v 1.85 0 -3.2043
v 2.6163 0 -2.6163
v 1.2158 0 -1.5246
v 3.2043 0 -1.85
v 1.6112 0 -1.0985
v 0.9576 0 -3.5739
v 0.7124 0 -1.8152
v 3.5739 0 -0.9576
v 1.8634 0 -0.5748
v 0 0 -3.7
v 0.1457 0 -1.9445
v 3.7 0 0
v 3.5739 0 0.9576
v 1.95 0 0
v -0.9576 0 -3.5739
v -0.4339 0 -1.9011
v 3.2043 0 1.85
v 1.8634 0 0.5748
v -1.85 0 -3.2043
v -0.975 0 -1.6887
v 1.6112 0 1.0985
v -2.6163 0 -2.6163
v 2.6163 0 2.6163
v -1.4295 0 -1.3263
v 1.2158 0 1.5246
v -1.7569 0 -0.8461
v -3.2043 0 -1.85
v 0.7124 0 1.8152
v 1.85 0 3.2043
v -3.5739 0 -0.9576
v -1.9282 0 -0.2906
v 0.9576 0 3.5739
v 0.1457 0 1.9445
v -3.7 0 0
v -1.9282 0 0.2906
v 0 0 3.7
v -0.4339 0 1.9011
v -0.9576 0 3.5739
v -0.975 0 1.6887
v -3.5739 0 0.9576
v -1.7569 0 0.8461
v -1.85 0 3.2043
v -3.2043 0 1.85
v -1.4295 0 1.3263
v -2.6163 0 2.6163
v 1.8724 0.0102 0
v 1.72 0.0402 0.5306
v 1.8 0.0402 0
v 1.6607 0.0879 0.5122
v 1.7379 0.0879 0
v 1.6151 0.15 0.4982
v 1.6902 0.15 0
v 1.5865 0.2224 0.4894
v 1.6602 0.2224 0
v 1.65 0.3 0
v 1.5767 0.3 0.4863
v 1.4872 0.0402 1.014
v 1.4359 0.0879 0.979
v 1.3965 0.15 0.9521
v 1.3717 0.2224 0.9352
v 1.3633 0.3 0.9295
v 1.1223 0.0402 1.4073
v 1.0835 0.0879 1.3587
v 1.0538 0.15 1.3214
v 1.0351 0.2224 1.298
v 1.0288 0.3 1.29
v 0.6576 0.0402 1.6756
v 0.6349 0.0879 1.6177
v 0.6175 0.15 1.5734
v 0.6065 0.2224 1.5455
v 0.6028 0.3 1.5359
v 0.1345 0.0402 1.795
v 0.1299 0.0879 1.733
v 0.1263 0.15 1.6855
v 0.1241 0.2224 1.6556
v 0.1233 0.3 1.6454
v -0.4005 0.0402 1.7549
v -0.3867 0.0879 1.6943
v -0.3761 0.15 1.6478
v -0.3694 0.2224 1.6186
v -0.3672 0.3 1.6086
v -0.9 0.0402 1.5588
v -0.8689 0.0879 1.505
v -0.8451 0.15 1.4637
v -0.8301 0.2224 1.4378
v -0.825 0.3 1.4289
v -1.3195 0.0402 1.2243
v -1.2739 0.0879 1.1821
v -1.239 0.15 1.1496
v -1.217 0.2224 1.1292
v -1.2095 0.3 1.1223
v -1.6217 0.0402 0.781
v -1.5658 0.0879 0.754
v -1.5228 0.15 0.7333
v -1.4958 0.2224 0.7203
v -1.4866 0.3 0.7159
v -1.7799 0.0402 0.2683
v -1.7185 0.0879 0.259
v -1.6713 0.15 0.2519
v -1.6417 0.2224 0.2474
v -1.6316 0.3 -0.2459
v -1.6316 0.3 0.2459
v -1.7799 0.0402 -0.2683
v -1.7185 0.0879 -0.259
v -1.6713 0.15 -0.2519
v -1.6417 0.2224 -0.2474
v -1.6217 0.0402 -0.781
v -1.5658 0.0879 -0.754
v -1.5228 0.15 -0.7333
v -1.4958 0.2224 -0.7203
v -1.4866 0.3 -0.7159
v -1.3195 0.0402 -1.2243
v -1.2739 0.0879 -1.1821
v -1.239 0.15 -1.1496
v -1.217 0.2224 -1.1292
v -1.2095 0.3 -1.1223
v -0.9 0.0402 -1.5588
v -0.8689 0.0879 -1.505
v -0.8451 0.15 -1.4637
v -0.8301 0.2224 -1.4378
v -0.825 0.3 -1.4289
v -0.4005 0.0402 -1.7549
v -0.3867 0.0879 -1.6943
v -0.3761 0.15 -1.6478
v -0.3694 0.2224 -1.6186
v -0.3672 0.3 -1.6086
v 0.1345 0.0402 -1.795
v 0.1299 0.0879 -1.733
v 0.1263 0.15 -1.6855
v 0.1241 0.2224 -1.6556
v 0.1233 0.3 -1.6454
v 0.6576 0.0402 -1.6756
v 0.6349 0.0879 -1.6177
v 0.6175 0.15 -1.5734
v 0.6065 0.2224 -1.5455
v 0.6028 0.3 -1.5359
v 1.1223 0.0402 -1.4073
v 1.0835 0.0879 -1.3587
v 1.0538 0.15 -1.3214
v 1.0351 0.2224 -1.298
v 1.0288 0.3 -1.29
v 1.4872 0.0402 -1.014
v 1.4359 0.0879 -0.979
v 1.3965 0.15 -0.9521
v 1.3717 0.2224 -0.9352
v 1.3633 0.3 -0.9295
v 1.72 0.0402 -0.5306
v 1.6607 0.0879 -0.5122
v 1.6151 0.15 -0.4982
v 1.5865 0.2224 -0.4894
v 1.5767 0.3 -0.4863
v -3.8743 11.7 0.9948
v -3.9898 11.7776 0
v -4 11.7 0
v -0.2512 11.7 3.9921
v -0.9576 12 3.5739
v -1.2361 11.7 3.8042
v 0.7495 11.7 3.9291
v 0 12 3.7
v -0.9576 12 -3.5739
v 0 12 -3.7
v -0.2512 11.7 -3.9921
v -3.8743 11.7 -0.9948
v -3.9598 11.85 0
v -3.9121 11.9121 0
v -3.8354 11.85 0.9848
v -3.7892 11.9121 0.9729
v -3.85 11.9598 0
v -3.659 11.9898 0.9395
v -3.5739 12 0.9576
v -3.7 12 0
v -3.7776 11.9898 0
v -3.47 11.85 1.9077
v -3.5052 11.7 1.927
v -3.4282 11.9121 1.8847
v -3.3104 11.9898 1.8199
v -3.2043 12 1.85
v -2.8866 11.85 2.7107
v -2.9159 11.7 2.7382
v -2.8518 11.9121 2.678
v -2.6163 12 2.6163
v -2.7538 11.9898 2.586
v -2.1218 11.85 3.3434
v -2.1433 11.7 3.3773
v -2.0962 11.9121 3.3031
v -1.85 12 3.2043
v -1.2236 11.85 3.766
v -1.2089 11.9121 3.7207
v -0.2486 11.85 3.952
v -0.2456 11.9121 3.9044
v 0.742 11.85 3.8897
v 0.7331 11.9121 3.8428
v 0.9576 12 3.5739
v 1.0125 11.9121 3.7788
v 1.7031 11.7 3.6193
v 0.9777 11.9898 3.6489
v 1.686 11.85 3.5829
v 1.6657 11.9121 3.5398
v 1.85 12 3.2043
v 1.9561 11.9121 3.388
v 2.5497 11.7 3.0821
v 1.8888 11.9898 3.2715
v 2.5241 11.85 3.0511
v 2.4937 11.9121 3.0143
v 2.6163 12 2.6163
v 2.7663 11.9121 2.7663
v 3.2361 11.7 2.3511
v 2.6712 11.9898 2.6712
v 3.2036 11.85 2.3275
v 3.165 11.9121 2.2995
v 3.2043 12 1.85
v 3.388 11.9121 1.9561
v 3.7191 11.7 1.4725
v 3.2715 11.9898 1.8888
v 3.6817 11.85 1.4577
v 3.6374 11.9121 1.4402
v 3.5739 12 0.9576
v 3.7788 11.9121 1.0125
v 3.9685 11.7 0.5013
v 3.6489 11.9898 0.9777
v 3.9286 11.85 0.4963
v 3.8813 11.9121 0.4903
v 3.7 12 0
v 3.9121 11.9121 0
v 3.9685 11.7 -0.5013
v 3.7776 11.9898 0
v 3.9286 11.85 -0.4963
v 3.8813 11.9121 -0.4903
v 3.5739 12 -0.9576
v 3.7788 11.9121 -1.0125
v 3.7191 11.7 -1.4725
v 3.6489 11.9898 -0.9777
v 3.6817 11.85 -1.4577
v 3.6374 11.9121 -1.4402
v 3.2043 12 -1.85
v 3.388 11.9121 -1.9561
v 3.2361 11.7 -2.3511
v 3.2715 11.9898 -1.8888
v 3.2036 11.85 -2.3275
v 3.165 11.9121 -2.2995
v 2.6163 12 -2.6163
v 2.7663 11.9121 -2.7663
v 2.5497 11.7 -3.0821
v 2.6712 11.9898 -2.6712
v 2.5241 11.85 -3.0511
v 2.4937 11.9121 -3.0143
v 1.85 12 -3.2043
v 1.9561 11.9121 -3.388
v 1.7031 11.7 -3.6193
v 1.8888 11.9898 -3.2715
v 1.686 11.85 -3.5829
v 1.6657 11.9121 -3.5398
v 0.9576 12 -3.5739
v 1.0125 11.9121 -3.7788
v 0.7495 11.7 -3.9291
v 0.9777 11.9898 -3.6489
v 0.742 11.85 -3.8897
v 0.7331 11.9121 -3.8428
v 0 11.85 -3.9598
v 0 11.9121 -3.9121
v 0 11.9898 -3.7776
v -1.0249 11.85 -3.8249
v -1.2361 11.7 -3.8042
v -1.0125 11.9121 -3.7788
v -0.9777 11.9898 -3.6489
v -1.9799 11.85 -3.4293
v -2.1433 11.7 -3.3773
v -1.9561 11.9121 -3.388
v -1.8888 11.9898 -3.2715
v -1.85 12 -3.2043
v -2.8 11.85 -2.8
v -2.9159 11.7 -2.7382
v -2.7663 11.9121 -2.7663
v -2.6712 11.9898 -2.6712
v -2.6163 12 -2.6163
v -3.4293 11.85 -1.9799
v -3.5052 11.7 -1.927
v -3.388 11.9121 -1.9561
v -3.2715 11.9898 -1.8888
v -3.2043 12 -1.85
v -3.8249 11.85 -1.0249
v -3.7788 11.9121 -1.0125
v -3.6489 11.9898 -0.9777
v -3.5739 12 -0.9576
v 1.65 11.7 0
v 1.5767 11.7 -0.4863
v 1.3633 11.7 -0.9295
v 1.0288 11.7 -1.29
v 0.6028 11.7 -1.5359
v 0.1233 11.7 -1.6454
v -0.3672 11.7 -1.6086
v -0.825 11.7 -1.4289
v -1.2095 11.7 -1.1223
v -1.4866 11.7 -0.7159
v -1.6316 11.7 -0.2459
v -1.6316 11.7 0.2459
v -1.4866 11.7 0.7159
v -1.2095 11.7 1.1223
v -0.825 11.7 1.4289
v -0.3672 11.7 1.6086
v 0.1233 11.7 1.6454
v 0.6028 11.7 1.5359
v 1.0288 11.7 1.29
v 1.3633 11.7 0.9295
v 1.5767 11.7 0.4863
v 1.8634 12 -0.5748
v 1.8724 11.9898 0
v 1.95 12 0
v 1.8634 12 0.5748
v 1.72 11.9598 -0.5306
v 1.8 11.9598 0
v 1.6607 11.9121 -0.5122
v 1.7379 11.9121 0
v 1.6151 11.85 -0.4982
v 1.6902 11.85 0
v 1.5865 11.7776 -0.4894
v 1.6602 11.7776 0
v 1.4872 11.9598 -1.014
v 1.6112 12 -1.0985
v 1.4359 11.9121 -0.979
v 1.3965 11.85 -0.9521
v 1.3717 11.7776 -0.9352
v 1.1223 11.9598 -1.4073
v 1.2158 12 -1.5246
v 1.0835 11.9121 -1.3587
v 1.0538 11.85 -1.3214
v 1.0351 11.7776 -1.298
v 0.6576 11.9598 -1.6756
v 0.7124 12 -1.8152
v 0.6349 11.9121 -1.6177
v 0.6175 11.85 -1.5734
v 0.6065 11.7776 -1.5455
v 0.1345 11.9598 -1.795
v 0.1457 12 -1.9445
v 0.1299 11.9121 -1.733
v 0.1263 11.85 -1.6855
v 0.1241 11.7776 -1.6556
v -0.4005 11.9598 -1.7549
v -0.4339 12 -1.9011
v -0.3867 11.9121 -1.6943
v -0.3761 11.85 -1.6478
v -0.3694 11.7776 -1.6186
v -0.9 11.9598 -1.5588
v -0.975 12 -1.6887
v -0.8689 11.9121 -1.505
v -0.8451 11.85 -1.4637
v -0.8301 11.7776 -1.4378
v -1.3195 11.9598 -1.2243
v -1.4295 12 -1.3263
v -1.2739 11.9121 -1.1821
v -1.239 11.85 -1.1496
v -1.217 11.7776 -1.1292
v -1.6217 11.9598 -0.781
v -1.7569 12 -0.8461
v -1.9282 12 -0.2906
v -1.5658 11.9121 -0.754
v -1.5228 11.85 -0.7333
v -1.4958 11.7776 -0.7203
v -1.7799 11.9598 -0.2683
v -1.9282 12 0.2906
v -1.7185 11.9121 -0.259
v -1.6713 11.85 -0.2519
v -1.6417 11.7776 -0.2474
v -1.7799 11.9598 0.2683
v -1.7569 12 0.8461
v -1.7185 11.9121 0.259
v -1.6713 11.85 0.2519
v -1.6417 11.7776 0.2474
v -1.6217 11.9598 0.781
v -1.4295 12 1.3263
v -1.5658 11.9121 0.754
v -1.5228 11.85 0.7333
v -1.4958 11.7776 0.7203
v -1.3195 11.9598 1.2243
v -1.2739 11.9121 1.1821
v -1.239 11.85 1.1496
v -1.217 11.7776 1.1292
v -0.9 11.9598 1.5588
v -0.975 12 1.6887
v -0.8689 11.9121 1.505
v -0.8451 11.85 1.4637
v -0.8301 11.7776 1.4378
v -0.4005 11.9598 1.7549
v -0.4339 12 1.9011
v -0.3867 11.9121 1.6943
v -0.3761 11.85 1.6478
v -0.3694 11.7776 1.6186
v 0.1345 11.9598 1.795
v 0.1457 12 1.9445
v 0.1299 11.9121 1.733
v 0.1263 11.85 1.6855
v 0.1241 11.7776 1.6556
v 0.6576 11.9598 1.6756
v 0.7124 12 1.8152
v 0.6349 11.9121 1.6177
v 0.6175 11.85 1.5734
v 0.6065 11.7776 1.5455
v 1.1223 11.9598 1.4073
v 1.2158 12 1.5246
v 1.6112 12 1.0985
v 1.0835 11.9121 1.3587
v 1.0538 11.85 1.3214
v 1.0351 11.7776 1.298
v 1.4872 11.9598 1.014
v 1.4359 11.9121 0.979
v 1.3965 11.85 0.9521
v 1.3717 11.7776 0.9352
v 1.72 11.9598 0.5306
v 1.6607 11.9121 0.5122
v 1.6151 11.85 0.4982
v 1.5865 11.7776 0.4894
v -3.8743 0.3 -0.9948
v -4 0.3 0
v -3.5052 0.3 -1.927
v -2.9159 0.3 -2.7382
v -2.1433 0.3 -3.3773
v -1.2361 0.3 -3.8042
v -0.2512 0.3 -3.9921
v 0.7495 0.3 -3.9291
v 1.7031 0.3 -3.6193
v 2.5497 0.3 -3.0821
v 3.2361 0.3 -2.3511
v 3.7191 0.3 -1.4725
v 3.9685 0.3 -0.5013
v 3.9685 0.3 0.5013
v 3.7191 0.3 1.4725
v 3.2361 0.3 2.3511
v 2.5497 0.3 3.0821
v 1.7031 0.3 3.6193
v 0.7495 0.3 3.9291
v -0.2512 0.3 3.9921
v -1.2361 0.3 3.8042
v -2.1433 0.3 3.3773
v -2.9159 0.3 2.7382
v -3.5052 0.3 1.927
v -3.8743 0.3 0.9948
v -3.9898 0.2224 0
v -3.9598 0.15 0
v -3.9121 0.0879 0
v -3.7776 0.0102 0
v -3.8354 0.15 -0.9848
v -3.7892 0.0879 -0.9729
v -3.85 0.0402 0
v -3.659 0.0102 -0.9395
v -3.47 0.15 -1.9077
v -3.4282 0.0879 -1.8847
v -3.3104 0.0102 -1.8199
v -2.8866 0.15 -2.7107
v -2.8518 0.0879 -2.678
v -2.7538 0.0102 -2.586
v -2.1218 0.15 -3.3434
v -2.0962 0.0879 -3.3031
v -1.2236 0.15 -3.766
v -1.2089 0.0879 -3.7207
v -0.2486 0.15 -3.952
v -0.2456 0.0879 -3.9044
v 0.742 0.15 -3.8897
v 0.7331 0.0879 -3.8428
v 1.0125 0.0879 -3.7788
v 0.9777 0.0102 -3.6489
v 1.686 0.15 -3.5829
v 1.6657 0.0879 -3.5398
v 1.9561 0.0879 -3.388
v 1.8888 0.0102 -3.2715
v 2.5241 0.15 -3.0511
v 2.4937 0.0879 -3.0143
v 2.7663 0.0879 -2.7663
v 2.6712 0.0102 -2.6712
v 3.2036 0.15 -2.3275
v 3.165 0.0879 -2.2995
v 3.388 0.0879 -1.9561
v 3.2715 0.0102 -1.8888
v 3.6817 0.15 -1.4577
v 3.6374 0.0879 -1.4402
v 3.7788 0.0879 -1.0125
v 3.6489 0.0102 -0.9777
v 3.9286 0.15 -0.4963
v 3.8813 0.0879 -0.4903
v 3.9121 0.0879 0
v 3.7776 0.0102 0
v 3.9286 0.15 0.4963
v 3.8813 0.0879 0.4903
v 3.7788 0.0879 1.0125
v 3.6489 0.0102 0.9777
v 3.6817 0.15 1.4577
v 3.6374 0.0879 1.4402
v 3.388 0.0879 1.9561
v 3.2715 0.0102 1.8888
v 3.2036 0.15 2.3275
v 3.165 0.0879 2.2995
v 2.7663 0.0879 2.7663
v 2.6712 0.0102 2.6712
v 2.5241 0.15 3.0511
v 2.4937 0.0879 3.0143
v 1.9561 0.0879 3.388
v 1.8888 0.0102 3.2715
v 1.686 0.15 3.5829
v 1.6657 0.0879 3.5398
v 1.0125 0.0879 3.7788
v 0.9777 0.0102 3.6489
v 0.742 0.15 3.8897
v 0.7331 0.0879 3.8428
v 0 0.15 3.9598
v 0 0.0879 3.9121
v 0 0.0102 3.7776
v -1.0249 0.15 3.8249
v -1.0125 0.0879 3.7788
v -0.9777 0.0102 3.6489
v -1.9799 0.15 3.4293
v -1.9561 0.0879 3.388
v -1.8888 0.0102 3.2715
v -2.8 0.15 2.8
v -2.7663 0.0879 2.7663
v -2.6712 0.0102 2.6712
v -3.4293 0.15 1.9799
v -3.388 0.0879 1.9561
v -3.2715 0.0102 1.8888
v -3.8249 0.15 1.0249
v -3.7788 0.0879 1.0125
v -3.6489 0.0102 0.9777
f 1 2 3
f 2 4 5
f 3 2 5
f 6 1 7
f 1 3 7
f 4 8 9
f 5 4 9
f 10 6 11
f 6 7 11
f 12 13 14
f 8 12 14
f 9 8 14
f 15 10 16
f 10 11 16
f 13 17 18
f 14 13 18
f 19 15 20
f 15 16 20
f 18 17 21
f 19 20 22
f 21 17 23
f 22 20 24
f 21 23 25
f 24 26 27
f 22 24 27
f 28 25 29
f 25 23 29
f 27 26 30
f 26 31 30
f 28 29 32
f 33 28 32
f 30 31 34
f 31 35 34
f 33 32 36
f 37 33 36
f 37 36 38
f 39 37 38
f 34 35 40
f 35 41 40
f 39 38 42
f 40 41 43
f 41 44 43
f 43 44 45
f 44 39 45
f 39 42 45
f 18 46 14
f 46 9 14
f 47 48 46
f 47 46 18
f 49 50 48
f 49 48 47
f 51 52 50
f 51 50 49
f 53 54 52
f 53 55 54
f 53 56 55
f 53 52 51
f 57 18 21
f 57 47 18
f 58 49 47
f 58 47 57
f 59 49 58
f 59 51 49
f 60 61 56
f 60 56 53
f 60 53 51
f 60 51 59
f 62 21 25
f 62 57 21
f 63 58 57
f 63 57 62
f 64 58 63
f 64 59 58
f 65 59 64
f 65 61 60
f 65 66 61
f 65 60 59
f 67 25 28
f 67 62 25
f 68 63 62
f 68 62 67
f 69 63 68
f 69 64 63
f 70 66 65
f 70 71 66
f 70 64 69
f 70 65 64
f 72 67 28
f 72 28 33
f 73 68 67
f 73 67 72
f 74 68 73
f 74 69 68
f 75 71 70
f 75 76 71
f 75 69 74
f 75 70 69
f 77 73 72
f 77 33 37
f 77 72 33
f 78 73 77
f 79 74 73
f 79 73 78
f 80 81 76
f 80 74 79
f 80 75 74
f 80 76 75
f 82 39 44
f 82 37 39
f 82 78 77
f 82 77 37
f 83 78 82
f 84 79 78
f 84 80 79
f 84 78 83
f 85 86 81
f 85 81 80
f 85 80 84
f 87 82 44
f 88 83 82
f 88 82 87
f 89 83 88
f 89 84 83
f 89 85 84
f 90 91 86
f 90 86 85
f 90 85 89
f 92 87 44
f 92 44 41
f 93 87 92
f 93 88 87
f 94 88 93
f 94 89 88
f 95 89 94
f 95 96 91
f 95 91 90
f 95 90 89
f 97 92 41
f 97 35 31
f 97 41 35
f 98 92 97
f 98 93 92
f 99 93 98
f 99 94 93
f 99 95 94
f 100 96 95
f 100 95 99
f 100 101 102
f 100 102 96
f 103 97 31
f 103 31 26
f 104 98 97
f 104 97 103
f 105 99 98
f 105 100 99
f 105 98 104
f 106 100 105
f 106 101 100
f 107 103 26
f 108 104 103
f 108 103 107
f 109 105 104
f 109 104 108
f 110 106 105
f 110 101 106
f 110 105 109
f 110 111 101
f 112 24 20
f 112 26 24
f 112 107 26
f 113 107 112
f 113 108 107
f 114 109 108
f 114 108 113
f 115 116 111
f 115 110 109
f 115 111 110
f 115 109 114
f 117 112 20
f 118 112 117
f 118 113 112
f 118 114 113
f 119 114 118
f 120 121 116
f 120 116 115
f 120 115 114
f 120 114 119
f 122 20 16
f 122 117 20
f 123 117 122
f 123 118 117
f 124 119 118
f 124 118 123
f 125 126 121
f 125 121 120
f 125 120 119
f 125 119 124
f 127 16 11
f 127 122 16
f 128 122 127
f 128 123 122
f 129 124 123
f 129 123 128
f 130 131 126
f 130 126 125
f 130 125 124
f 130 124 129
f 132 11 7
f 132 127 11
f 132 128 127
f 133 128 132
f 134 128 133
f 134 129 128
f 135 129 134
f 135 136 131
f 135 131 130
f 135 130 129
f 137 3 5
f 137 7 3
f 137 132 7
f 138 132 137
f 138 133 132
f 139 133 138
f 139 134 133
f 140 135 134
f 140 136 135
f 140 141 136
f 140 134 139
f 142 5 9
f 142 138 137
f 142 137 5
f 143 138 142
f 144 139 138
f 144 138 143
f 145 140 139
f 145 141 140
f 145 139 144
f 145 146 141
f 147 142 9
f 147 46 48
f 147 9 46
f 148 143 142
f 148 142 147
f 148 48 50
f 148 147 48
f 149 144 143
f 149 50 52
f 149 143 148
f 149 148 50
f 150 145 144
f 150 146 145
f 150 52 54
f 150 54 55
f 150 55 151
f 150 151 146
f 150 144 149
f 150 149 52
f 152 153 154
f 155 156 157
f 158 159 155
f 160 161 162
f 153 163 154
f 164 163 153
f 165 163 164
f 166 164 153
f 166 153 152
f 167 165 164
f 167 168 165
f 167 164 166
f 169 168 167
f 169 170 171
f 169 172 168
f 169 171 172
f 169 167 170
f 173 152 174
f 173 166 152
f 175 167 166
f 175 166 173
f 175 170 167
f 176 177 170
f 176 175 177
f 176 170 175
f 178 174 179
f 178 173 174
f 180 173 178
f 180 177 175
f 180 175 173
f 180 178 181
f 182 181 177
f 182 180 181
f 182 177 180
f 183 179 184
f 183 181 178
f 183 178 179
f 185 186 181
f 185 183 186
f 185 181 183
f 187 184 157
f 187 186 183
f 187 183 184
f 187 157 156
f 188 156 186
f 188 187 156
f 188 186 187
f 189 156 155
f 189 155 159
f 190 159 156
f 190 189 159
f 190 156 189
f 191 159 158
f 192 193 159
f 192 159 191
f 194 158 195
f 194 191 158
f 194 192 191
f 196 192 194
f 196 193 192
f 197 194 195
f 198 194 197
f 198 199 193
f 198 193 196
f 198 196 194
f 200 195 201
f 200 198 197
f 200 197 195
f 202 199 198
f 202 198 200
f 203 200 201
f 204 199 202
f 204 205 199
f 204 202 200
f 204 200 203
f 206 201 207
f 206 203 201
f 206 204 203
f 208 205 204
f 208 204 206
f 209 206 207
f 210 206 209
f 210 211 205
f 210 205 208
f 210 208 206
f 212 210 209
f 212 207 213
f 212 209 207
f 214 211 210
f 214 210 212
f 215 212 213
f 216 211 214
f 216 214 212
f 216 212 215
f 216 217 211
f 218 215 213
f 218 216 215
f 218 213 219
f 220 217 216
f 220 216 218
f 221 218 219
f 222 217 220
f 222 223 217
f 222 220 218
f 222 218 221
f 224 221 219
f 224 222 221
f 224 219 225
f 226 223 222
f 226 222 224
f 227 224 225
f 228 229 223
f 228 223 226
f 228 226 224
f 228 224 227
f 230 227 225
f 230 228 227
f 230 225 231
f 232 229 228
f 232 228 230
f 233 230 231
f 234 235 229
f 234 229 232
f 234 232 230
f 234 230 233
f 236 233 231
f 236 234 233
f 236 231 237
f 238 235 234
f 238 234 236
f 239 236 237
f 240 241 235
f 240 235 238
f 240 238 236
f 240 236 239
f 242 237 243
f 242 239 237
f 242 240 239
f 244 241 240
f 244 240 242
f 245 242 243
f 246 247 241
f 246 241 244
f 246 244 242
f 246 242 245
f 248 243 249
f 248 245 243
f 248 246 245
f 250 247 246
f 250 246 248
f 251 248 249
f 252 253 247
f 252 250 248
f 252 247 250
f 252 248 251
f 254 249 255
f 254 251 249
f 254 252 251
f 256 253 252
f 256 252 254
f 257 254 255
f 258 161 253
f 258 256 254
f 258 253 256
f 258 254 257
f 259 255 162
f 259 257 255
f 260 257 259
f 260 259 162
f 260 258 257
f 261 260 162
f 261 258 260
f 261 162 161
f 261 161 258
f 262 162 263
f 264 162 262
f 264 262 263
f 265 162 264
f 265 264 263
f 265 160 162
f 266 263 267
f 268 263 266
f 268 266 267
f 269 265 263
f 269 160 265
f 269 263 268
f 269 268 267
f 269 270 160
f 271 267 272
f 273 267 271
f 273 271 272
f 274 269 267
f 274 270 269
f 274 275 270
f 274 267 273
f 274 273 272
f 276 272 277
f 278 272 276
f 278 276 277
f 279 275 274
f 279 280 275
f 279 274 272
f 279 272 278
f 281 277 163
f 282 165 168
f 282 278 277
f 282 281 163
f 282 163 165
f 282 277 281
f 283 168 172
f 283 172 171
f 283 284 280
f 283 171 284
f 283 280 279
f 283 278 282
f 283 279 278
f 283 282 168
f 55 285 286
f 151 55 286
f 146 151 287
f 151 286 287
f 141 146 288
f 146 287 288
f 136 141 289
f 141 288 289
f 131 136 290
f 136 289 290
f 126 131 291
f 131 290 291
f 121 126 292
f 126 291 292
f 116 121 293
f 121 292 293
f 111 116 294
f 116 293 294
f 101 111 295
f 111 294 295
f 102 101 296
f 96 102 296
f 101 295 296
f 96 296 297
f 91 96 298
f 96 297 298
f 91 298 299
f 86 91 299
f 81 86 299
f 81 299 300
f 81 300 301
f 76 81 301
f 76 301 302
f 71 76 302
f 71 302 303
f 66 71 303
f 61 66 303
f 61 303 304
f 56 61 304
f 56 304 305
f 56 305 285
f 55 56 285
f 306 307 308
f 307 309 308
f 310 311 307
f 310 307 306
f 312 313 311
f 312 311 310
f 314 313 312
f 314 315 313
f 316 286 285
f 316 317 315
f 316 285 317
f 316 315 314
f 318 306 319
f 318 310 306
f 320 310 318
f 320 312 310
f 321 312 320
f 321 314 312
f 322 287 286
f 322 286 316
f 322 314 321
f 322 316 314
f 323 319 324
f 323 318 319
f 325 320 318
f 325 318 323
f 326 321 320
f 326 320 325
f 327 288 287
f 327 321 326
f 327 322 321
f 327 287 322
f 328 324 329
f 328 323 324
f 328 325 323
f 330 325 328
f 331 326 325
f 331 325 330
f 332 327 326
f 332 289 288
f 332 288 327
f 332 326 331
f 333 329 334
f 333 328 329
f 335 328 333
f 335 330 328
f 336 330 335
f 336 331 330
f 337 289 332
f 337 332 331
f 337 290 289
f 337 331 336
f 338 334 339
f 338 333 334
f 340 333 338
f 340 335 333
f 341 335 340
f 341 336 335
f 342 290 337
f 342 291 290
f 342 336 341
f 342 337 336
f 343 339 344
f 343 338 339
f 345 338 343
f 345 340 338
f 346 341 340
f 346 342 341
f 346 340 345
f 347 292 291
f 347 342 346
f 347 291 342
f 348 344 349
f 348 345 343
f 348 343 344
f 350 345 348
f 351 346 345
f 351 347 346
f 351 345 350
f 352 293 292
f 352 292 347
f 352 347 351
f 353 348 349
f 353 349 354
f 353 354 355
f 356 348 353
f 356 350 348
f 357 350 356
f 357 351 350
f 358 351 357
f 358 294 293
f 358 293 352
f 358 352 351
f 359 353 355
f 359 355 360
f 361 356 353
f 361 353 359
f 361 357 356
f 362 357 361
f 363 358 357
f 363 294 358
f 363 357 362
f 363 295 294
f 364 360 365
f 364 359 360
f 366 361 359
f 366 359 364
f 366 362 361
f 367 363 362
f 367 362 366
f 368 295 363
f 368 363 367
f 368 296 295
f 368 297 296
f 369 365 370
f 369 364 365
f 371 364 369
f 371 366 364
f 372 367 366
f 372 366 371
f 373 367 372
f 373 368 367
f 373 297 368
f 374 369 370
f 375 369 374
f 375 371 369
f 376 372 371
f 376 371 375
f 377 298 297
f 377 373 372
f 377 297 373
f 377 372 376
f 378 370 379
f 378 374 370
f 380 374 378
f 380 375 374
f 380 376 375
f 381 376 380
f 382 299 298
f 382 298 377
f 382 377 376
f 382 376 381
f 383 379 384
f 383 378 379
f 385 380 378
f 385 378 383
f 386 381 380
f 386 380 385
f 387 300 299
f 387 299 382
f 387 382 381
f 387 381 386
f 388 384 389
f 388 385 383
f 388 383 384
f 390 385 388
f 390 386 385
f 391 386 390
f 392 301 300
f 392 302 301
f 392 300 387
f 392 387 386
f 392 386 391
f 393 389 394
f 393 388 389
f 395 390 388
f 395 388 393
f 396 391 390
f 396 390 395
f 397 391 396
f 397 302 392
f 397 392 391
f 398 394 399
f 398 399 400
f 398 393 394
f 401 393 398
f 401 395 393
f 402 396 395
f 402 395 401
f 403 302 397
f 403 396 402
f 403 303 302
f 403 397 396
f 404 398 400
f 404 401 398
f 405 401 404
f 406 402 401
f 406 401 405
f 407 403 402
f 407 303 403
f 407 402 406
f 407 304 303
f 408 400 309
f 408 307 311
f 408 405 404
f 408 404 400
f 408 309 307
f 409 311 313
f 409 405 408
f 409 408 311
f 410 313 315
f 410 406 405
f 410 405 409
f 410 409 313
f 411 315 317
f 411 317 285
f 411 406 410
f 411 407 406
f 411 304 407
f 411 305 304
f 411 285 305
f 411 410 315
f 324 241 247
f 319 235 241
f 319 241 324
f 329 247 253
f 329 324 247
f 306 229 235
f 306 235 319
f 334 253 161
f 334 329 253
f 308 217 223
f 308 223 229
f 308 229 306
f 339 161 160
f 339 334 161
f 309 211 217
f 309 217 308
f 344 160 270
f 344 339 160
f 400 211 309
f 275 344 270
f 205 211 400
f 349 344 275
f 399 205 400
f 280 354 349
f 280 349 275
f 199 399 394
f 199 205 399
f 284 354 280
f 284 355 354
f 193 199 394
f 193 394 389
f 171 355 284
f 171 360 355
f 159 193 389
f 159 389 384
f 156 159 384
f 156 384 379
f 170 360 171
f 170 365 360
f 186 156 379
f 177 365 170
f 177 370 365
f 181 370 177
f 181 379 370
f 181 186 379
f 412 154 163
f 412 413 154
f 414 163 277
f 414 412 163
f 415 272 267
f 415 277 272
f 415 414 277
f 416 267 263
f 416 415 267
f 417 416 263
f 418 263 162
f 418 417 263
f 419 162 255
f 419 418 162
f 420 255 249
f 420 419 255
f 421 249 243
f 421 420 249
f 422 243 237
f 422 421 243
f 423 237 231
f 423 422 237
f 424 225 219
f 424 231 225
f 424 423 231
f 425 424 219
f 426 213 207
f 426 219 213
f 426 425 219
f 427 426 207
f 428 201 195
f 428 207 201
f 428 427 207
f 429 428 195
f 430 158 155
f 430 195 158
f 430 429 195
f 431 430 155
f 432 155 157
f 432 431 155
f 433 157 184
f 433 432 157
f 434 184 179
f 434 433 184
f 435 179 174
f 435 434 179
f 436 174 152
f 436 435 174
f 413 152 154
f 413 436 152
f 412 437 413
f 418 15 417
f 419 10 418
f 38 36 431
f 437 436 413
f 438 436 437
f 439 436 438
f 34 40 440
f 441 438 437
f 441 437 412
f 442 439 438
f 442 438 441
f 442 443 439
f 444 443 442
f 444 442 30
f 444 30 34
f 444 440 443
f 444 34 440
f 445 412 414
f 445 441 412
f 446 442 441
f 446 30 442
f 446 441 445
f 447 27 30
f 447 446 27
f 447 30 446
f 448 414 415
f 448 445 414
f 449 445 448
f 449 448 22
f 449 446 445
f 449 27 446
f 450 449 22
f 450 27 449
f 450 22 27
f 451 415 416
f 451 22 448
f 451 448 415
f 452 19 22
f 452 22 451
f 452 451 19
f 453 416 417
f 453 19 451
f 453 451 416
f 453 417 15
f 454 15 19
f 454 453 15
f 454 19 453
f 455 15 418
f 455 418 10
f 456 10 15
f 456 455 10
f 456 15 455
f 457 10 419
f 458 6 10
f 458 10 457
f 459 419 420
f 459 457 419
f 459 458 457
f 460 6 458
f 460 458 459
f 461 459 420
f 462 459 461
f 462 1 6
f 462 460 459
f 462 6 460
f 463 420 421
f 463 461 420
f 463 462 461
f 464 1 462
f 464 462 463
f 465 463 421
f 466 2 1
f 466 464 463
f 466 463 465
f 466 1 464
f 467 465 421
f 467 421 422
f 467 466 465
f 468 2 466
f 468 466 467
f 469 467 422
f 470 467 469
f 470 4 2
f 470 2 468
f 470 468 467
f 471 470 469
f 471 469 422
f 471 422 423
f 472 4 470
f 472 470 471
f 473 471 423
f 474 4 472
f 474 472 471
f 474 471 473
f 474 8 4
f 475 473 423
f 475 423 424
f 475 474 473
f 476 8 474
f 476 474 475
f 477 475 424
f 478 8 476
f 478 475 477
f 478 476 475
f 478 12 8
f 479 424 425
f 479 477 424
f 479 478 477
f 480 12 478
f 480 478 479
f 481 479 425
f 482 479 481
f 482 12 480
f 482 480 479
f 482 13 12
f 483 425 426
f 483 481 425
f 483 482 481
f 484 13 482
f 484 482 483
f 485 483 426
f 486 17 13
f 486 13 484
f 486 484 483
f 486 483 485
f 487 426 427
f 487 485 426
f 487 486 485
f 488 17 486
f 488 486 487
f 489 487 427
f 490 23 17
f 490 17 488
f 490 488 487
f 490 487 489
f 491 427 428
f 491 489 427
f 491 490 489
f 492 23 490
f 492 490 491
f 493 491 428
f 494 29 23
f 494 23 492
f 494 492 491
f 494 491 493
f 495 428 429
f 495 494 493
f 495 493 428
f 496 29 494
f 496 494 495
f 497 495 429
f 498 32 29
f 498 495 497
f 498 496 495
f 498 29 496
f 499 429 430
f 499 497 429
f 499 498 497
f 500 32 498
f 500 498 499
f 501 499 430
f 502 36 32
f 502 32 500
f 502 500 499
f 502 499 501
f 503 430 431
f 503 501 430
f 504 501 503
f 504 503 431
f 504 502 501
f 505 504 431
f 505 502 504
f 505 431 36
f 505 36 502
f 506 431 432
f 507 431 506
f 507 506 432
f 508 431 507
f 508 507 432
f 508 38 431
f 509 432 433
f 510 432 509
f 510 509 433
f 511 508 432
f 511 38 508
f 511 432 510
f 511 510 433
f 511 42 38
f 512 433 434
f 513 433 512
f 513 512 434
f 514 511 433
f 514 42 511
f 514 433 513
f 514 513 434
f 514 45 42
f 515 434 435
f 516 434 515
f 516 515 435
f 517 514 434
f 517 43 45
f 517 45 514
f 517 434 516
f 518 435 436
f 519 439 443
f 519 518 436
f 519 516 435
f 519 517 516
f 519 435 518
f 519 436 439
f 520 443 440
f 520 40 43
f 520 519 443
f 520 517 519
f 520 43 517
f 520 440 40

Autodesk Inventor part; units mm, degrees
ref_plane "YZ Plane" through (0, 0, 0) normal (1, 0, 0) x (0, 1, 0)
ref_plane "XZ Plane" through (0, 0, 0) normal (0, 1, 0) x (-1, 0, 0)
ref_plane "XY Plane" through (0, 0, 0) normal (0, 0, 1) x (1, 0, 0)
sketch "スケッチ1" plane through (0, 0, 0) normal (0, 1, 0) x (-1, 0, 0)
  circle A0 centre (0, 0) radius 4
  dimension "d0" = 8
extrude "押し出し1" add sketch "スケッチ1" along normal blind 12
sketch "スケッチ2" plane through (0, 12, 0) normal (0, 1, 0) x (1, 0, 0)
  circle A0 centre (0, 0) radius 1.65
  dimension "d3" = 3.3
extrude "押し出し2" cut sketch "スケッチ2" against normal through all
thread "ねじ1" size "M4x0.7" class "6H" standard "ISO Metric profile" full length
fillet "フィレット1" radius 0.3 4 edges at (-1.65, 12, 0) (4, 12, 0) (-1.65, 0, 0) (4, 0, 0)
properties part number "ARL-412KE"
